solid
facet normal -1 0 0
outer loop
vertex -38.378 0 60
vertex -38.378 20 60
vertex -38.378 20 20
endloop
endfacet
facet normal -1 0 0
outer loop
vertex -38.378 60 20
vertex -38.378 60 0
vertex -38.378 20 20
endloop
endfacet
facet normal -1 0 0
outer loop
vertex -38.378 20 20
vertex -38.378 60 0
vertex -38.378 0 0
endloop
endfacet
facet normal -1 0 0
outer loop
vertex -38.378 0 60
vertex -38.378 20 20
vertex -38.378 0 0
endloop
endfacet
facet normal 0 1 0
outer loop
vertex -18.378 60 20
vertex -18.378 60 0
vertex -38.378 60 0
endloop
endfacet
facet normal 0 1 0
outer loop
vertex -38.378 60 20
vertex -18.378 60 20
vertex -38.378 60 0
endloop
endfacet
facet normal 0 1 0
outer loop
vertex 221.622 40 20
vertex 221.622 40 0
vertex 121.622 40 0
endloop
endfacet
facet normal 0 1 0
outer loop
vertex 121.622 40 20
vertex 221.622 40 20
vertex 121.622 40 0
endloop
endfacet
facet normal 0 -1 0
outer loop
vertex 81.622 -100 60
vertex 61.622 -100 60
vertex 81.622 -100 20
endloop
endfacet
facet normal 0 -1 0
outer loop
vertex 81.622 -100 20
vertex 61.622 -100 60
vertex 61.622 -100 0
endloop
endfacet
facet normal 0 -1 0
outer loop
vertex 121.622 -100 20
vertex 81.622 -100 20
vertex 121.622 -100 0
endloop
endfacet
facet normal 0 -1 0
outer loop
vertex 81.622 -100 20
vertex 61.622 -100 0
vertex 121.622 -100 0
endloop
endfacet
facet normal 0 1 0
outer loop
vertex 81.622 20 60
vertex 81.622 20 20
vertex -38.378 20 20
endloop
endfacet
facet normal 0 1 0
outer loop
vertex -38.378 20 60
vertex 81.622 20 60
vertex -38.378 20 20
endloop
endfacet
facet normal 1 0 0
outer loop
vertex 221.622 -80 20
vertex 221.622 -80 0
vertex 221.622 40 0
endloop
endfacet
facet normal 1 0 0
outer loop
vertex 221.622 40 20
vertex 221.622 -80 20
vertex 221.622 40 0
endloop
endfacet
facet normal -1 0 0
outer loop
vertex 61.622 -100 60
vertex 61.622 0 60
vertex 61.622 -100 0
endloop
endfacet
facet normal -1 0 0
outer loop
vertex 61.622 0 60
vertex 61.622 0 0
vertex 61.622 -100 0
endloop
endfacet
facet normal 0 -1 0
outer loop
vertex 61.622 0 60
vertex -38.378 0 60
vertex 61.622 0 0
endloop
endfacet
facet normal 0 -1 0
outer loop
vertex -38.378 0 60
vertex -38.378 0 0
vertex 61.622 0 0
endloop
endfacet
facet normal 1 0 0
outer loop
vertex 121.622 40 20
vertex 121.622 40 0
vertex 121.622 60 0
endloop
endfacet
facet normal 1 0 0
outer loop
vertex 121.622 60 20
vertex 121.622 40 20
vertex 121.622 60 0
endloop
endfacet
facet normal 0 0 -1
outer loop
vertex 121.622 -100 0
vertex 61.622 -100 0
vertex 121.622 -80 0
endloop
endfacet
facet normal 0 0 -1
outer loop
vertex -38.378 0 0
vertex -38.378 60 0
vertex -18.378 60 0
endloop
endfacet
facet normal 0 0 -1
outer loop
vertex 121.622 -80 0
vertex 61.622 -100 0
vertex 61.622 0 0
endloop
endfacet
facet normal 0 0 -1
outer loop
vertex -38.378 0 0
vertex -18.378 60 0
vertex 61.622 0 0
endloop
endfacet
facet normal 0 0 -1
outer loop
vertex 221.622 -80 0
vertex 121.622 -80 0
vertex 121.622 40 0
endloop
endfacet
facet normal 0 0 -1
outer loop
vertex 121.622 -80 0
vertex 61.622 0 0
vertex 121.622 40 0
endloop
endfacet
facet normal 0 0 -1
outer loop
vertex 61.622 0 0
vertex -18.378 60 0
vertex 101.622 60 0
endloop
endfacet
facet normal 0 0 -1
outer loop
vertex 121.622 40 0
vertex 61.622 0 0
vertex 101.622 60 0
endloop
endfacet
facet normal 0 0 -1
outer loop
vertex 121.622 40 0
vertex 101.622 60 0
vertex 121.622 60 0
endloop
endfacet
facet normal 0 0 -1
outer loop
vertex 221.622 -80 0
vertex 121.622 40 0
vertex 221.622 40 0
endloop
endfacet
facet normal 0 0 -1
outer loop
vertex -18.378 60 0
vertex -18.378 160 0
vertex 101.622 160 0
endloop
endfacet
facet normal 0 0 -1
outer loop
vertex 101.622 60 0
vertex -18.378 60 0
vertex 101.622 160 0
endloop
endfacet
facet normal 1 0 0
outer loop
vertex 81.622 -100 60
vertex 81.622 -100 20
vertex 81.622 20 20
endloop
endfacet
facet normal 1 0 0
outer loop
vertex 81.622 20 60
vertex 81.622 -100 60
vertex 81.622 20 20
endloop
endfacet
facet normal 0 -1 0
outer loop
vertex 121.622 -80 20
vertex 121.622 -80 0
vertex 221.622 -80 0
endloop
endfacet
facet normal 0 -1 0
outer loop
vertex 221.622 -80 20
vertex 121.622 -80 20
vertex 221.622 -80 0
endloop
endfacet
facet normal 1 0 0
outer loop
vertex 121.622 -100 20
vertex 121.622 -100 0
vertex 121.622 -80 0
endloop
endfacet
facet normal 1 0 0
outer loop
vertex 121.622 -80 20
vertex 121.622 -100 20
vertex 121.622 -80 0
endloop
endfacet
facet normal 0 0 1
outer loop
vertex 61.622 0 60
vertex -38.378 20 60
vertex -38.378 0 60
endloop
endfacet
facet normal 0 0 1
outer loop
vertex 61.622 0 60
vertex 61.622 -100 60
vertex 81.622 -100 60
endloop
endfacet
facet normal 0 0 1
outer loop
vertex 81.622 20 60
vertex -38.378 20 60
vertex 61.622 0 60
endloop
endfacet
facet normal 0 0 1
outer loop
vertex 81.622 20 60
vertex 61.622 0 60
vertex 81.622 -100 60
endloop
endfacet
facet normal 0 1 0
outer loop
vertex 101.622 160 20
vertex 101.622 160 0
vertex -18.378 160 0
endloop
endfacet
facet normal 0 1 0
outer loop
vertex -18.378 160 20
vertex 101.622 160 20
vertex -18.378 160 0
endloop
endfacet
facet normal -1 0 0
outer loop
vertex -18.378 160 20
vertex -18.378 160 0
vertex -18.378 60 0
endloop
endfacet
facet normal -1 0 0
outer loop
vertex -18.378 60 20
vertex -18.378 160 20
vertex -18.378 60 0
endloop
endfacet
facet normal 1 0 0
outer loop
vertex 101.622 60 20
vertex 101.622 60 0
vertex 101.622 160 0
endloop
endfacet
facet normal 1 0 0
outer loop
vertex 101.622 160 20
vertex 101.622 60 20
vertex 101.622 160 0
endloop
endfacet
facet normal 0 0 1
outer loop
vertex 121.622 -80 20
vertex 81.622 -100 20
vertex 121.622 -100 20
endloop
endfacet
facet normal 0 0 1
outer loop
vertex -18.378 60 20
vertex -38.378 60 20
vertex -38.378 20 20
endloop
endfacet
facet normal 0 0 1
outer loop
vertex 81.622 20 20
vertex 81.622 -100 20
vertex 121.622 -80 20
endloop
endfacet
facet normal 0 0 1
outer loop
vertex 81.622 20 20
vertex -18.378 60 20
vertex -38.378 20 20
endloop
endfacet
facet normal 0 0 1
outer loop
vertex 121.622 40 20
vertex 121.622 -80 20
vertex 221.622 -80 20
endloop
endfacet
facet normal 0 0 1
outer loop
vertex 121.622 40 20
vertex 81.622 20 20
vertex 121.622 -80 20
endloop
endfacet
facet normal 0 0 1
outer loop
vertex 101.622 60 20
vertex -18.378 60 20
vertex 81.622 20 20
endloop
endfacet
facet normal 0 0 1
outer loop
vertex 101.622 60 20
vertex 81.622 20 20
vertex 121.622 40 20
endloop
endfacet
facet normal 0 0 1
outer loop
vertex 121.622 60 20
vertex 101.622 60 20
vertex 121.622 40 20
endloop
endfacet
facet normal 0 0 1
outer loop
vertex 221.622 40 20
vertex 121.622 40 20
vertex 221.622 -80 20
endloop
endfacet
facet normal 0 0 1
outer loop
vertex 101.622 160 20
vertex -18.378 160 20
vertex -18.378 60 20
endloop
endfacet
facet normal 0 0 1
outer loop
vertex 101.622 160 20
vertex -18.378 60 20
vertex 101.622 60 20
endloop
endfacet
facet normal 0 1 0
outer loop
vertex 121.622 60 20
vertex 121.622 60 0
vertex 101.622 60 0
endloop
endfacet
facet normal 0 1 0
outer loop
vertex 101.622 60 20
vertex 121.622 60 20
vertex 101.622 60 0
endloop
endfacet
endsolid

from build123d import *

# Parameters (mm, degrees)
F1_DEPTH = 20
F3_DEPTH = 40


with BuildPart() as f1:
    # F0 (on Top) → F1 (new body)
    with BuildSketch(Plane.XY):
        Polygon((-38.37838, 60), (-38.37838, 0), (61.62162, 0), (121.62162, 60), (101.62162, 60), (101.62162, 160), (-18.37838, 160), (-18.37838, 60), align=None)
        Polygon((121.62162, 60), (61.62162, 0), (61.62162, -100), (121.62162, -100), (121.62162, -80), (221.62162, -80), (221.62162, 40), (121.62162, 40), align=None)
    extrude(amount=F1_DEPTH)

    # F2 (on face) → F3 (join)
    with BuildSketch(Plane.XY.offset(20)):
        Polygon((-38.37838, 20), (-38.37838, 0), (61.62162, 0), (61.62162, -100), (81.62162, -100), (81.62162, 0), (81.62162, 20), align=None)
    extrude(amount=F3_DEPTH)


solid = f1.part
